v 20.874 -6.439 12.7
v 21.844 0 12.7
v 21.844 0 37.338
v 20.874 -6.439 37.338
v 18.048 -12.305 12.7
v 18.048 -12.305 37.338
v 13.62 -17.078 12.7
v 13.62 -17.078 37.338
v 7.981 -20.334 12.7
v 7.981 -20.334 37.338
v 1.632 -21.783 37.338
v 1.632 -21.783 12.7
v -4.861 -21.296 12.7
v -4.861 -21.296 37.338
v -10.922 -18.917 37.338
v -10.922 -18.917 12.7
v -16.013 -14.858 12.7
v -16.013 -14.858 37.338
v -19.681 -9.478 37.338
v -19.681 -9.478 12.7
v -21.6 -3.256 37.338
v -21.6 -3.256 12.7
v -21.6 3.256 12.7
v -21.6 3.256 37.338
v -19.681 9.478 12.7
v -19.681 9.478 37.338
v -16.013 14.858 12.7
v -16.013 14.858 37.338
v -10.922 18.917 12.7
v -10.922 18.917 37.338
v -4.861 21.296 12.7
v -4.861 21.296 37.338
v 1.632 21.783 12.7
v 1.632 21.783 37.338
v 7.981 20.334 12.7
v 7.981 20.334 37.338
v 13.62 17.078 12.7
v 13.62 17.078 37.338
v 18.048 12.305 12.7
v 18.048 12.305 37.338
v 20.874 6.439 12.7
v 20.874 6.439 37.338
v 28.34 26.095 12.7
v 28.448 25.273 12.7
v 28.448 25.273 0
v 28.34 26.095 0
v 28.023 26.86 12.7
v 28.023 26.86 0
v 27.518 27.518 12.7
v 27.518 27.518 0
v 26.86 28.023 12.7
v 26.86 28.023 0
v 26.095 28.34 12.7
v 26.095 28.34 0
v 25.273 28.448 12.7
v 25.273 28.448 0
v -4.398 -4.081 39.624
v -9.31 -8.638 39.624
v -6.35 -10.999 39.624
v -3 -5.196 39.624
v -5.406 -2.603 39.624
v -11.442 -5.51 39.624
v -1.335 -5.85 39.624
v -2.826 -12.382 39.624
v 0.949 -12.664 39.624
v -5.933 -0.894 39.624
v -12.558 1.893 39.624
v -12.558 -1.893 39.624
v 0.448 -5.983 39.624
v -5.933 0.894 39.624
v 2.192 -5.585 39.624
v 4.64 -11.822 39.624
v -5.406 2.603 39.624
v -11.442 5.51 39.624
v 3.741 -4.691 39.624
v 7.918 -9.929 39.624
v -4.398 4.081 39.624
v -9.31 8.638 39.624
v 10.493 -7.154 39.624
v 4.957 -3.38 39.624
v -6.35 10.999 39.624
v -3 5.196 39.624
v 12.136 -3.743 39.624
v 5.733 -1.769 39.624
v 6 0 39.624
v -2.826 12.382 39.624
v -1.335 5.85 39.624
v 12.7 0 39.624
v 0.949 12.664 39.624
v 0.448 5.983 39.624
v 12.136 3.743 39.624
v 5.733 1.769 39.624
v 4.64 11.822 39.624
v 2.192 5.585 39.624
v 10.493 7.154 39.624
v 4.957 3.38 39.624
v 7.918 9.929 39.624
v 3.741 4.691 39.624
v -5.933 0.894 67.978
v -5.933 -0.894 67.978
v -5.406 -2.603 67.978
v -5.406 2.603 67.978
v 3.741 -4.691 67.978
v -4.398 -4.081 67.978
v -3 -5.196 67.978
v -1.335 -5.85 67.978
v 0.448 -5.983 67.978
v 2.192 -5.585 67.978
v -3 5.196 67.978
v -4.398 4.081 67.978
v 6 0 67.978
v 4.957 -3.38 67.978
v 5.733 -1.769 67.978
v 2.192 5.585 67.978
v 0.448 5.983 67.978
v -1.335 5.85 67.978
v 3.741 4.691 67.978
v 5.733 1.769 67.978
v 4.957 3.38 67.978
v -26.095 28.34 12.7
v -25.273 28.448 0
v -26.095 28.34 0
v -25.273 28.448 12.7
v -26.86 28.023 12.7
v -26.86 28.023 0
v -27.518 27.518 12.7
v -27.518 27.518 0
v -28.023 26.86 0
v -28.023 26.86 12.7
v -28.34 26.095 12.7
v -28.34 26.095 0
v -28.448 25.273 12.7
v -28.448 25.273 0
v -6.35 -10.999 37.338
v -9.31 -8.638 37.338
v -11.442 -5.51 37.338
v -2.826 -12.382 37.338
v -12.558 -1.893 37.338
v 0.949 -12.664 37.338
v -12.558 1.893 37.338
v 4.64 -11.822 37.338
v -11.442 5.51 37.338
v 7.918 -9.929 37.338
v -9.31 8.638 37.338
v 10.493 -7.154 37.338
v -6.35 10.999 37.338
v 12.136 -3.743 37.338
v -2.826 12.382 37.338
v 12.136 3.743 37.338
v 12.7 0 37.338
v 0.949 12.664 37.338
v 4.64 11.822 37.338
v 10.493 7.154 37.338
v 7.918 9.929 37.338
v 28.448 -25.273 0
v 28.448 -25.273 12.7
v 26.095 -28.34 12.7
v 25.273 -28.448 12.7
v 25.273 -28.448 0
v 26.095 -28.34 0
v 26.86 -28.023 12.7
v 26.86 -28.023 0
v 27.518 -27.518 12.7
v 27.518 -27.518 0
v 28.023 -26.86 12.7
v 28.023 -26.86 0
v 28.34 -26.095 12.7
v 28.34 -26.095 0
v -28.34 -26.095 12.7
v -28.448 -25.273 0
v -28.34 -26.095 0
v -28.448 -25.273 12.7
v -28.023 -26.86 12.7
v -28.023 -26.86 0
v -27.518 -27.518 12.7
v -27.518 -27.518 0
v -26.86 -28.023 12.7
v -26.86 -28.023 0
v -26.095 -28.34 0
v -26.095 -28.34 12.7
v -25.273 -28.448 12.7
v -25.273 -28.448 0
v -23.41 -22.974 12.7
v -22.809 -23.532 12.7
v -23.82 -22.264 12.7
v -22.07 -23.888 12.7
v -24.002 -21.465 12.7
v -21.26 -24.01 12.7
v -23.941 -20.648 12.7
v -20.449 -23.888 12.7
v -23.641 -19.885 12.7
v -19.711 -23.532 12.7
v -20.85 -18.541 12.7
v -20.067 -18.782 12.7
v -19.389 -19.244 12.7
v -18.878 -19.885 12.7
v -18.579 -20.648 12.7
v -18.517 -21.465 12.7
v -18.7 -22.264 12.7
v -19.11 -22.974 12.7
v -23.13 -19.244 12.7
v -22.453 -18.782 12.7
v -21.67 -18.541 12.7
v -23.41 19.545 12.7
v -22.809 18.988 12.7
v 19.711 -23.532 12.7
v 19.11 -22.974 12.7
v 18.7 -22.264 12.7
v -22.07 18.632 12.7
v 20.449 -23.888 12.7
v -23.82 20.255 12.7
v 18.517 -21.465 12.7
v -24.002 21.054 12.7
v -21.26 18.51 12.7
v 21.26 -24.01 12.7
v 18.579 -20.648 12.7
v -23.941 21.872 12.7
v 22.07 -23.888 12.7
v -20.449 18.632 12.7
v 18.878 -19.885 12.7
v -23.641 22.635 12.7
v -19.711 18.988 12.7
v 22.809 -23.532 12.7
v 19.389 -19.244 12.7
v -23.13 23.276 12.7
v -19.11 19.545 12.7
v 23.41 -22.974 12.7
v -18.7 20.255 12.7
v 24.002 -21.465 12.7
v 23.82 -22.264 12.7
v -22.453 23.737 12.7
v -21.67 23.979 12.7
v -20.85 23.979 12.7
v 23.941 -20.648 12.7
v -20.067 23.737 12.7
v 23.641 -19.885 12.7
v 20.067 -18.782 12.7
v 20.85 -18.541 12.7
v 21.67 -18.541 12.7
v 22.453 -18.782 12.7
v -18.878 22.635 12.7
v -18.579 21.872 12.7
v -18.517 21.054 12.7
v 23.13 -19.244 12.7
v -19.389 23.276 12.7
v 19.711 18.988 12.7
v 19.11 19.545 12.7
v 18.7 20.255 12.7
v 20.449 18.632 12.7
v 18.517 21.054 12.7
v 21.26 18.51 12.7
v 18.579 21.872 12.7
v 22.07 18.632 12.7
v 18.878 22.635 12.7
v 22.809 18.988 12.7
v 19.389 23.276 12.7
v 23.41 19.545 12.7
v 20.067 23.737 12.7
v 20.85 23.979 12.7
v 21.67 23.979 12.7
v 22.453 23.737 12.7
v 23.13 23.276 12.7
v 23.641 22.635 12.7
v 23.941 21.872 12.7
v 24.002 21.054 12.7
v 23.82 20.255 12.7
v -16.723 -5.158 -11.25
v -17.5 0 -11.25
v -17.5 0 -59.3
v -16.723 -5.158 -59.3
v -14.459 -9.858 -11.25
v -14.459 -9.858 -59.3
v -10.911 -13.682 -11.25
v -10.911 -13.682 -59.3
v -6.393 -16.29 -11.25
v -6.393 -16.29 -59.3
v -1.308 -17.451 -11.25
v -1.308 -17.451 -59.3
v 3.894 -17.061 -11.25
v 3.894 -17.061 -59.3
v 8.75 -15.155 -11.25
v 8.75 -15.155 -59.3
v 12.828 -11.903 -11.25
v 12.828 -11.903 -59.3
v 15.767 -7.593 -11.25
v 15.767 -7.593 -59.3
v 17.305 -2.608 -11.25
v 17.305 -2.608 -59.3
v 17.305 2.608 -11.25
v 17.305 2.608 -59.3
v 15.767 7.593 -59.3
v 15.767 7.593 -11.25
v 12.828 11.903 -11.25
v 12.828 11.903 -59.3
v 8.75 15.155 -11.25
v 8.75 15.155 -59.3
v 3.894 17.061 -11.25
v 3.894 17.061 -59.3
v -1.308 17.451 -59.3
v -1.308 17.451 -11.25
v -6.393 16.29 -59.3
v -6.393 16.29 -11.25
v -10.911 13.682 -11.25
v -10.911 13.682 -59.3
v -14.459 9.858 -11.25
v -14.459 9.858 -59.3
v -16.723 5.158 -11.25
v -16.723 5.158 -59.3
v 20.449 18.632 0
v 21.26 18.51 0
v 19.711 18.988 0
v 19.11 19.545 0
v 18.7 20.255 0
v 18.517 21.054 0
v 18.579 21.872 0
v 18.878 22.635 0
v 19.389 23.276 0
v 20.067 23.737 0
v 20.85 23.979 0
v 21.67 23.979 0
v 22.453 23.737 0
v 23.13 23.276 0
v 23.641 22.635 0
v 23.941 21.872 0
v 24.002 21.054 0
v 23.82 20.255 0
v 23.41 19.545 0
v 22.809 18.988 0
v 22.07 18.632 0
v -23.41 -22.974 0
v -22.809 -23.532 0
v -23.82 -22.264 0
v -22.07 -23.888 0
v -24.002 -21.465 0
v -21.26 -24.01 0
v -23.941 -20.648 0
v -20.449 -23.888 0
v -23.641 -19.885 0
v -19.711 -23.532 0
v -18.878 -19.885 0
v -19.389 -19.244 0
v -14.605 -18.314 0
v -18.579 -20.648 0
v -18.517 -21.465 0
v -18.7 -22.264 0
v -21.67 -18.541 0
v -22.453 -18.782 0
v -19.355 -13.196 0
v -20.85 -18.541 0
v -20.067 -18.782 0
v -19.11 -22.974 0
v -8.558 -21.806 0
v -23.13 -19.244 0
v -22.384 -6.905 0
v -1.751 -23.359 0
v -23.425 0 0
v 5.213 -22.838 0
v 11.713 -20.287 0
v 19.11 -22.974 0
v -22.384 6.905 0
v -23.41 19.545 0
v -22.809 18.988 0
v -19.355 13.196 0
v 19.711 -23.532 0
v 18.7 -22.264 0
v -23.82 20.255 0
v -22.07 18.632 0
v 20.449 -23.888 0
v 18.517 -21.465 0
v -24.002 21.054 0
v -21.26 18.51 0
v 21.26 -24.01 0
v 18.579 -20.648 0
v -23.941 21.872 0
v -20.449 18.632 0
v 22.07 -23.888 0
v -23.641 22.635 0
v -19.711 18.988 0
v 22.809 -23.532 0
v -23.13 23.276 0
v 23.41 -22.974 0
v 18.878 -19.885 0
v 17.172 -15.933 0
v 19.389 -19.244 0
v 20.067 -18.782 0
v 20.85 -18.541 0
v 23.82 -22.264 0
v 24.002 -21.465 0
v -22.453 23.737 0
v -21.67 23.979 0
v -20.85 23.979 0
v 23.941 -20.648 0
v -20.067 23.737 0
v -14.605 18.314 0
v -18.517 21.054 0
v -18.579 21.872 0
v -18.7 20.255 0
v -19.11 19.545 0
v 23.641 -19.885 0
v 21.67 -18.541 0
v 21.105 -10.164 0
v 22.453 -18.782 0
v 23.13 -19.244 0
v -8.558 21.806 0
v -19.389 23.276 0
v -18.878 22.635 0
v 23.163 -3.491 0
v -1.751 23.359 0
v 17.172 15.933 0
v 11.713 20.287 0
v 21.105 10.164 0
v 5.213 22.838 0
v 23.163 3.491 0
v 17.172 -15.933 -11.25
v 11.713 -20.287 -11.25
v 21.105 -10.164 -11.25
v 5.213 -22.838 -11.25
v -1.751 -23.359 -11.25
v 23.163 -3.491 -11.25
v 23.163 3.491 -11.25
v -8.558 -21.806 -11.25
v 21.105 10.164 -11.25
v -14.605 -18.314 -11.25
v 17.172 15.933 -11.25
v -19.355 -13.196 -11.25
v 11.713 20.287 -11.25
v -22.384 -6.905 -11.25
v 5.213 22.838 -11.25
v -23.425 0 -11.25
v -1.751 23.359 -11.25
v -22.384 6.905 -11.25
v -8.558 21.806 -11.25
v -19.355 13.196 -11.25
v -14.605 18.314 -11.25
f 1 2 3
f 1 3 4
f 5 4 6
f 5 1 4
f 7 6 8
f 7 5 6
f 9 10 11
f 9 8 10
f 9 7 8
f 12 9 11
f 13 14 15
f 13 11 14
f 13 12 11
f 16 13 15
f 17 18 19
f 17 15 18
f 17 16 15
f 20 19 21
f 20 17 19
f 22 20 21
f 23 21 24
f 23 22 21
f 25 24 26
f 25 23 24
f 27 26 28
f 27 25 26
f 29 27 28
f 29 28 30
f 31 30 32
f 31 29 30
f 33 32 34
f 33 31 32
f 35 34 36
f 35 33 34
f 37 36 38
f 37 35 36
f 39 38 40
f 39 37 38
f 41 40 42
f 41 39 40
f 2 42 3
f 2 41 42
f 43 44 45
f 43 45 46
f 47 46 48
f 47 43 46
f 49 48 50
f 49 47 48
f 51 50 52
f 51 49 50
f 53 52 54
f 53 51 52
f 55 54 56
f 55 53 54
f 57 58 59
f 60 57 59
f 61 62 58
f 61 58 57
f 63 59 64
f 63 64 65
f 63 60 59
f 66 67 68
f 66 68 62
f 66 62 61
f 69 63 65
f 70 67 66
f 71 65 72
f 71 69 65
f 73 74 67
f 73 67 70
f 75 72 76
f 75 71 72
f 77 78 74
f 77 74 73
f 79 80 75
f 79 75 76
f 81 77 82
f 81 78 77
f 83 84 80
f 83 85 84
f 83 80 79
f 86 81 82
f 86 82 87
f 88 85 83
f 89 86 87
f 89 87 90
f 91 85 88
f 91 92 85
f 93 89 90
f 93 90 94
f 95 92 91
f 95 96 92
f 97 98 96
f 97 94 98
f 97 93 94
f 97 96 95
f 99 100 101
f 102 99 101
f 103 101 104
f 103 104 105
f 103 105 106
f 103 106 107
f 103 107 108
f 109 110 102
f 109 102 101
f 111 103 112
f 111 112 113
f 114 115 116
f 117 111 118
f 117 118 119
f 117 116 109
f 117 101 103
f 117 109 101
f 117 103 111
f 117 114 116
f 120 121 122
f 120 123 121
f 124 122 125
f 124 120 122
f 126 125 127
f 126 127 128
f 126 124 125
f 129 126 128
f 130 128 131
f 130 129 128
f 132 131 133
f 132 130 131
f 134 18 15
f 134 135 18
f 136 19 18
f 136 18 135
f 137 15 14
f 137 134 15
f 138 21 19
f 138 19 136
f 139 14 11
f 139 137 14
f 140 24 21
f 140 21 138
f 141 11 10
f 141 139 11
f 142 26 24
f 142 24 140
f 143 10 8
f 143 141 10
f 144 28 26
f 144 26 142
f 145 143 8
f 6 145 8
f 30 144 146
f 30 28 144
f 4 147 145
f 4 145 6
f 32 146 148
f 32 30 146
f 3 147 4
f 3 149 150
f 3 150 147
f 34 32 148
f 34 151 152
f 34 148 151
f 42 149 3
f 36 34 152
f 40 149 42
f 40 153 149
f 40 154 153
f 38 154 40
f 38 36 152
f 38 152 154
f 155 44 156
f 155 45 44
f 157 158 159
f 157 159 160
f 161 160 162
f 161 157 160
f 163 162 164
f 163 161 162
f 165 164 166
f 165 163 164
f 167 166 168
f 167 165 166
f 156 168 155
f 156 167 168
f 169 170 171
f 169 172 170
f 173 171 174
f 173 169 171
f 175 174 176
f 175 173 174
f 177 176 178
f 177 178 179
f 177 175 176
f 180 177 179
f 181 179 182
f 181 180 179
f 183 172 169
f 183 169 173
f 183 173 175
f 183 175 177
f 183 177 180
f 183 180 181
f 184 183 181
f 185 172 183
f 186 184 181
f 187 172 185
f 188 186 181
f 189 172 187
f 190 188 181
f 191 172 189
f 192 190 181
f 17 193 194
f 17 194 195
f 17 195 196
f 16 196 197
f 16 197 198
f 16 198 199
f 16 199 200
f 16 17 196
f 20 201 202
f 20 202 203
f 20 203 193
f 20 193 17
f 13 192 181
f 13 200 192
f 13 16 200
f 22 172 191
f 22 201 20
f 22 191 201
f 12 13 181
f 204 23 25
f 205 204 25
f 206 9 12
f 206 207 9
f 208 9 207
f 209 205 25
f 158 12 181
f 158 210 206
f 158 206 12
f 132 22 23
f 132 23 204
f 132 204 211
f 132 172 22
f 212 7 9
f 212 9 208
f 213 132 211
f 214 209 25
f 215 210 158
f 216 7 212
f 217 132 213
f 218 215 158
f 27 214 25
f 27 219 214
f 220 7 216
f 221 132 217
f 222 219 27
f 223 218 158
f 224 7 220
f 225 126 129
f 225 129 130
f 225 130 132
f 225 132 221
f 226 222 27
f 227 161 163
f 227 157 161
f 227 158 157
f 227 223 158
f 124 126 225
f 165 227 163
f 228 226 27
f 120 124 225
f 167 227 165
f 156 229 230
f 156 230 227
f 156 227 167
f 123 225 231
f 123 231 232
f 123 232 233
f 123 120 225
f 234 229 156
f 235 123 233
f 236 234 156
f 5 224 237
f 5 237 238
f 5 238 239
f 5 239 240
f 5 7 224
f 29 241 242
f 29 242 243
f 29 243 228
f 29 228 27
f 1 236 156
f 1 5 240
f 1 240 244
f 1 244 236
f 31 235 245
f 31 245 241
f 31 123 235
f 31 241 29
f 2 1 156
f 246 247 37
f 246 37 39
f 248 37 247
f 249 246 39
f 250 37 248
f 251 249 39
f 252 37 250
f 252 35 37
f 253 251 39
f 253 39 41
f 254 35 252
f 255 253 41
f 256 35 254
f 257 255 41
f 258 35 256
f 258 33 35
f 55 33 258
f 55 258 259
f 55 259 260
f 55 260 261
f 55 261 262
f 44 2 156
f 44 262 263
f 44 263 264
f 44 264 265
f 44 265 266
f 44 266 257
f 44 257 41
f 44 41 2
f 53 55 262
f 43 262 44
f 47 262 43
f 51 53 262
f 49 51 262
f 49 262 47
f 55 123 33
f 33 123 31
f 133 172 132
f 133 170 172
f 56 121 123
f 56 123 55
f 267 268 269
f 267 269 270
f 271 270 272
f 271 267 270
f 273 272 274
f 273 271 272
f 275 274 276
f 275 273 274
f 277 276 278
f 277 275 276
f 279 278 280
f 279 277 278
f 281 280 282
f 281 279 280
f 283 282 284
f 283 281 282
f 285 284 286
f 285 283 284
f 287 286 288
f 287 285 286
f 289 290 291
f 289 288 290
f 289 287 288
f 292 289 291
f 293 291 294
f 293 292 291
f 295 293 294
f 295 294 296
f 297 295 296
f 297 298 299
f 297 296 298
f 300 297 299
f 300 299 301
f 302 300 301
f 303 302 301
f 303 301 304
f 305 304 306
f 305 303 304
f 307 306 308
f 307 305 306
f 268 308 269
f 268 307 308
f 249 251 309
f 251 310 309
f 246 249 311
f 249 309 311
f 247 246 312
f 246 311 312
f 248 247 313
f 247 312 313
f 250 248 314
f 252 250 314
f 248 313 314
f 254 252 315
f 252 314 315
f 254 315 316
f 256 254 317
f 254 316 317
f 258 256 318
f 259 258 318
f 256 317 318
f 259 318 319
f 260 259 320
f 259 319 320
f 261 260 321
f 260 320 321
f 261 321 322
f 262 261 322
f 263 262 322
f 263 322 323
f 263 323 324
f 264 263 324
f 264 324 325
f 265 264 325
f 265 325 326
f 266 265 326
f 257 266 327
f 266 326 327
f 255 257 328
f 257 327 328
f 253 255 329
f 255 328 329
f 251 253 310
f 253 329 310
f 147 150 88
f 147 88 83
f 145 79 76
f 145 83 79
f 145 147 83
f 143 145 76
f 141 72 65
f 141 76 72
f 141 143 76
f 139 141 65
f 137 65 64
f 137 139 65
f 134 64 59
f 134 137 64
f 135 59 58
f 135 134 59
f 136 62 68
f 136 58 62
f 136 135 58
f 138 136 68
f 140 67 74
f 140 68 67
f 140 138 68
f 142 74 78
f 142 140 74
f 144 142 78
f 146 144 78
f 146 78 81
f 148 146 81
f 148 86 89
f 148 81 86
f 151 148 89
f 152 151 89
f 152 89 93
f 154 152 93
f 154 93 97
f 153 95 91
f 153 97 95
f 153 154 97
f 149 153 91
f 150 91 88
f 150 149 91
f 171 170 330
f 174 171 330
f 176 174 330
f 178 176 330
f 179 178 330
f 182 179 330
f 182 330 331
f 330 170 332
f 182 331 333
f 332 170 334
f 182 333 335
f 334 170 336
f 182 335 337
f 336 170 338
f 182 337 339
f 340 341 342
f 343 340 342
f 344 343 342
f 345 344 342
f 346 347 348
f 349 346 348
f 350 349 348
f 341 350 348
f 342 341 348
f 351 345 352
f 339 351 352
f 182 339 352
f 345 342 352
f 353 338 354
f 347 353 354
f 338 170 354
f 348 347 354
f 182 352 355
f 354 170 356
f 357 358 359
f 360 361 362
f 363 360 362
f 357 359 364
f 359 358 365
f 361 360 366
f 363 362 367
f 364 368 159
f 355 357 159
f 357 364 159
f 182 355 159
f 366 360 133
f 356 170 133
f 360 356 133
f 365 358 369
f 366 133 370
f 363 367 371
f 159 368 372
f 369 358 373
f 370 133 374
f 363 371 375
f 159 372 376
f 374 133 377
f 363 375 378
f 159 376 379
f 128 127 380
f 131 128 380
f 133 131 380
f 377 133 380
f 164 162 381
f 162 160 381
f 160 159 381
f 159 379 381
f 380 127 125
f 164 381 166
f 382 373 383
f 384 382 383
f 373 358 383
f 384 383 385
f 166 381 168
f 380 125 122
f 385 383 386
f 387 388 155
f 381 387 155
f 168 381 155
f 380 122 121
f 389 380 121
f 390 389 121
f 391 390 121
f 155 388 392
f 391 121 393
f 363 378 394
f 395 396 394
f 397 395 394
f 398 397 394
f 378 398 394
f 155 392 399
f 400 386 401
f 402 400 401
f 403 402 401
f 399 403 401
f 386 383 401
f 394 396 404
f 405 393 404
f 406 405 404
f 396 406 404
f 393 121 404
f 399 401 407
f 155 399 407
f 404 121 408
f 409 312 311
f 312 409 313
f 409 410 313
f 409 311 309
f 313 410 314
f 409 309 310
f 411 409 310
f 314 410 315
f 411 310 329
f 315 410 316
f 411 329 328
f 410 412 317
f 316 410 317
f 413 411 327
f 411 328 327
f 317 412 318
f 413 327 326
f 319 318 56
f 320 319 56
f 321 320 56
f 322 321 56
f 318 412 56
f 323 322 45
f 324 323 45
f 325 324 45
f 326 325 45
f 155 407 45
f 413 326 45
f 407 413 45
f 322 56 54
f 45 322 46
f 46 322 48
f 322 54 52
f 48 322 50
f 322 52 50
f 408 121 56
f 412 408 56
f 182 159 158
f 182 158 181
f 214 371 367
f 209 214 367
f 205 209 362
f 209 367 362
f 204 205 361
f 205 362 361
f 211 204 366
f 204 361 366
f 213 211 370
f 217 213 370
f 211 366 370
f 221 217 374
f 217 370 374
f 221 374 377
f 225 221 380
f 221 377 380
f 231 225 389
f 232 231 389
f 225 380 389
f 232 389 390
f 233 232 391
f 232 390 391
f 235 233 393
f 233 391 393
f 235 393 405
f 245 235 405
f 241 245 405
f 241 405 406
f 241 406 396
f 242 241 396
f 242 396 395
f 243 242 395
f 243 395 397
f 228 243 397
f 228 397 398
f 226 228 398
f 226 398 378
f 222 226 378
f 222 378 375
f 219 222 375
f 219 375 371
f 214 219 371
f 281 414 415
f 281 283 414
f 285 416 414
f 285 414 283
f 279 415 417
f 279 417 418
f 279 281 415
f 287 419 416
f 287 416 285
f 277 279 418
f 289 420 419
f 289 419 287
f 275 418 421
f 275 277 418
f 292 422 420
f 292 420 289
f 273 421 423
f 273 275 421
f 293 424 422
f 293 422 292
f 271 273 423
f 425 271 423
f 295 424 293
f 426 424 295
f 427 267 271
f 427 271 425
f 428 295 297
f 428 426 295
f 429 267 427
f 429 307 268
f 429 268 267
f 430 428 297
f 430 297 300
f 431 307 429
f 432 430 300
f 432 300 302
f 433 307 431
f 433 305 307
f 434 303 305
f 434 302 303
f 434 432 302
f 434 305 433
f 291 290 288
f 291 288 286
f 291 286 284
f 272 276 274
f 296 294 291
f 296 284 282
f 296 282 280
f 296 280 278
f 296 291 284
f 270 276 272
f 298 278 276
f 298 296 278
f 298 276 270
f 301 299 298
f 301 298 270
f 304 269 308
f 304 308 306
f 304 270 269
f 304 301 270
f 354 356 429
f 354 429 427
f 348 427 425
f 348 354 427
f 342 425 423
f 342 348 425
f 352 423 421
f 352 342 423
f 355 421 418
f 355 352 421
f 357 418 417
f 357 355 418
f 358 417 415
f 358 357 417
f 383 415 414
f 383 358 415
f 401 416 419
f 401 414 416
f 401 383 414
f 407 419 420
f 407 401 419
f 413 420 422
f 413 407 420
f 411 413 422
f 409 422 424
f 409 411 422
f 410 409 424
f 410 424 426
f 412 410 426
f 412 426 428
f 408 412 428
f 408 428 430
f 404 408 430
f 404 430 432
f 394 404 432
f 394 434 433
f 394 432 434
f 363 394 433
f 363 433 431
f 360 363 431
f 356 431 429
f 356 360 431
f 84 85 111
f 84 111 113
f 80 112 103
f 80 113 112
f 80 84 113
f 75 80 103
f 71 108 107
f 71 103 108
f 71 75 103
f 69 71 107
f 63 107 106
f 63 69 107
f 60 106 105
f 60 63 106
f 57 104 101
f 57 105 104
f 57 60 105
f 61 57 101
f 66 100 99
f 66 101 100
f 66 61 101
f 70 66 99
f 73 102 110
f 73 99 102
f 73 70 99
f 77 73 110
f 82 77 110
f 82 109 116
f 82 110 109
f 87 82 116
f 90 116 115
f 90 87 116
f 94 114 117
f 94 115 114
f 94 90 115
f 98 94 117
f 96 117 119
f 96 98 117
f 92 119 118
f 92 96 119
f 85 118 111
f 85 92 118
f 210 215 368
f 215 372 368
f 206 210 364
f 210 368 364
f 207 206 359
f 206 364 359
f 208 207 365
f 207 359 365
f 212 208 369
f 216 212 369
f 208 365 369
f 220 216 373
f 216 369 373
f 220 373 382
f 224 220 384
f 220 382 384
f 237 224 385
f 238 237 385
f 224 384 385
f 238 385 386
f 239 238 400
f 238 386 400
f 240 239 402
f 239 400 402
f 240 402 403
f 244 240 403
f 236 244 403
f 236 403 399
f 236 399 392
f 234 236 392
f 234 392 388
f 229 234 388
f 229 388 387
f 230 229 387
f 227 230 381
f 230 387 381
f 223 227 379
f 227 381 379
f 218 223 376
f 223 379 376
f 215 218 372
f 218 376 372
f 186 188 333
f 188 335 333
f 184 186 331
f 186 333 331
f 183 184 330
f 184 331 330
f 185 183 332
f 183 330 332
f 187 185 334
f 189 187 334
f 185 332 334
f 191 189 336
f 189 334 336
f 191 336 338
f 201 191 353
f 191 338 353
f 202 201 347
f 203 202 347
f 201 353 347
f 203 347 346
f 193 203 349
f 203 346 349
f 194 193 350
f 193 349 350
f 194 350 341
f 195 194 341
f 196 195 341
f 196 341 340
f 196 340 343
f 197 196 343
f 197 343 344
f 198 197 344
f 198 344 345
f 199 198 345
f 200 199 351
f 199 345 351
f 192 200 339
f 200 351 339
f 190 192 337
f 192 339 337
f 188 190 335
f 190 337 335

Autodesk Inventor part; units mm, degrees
ref_plane "YZ Plane" through (0, 0, 0) normal (1, 0, 0) x (0, 1, 0)
ref_plane "XZ Plane" through (0, 0, 0) normal (0, 1, 0) x (-1, 0, 0)
ref_plane "XY Plane" through (0, 0, 0) normal (0, 0, 1) x (1, 0, 0)
sketch "Sketch1" plane through (0, 0, 0) normal (0, 0, 1) x (1, 0, 0)
  line L0 (-28.448, 28.448) -> (28.448, 28.448)
  line L1 (28.448, 28.448) -> (28.448, -28.448)
  line L2 (28.448, -28.448) -> (-28.448, -28.448)
  line L3 (-28.448, -28.448) -> (-28.448, 28.448)
  point P0 (0, 0)
  point P1 (-28.448, 0)
  point P2 (0, 28.448)
  dimension "d0" = 56.896
extrude "Extrusion1" add sketch "Sketch1" along normal blind 12.7
sketch "Sketch2" plane through (0, 0, 12.7) normal (0, 0, 1) x (1, 0, 0)
  circle A0 centre (0, 0) radius 21.844
  dimension "d4" = 43.688
extrude "Extrusion2" add sketch "Sketch2" along normal blind 24.638
sketch "Sketch3" plane through (0, 0, 37.338) normal (0, 0, 1) x (1, 0, 0)
  circle A0 centre (0, 0) radius 21.844 projected
  circle A1 centre (0, 0) radius 6
  dimension "d8" = 12
extrude "Extrusion3" add sketch "Sketch3" along normal blind 30.64 contours A1
thread "Thread1" size "1/2-13 UNC" class "2A" standard "ANSI Unified Screw Threads" full length
sketch "Sketch4" plane through (0, 0, 0) normal (0, 0, -1) x (-1, 0, 0)
  circle A0 centre (0, 0) radius 23.425
  dimension "d14" = 46.85
extrude "Extrusion4" add sketch "Sketch4" along normal blind 11.25
fillet "Fillet1" radius 3.175 4 edges at (28.448, 28.448, 6.35) (-28.448, 28.448, 6.35) (28.448, -28.448, 6.35) (-28.448, -28.448, 6.35)
sketch "Sketch5" plane through (0, 0, -11.25) normal (0, 0, -1) x (-1, 0, 0)
  circle A0 centre (0, 0) radius 23.425 projected
  circle A1 centre (0, 0) radius 17.5
  dimension "d21" = 35
extrude "Extrusion5" add sketch "Sketch5" along normal blind 48.05 contours A1
sketch "Sketch6" plane through (0, 0, 12.7) normal (0, 0, 1) x (1, 0, 0)
  line L0 (28.448, -25.273) -> (28.448, 25.273) projected
  line L1 (25.273, 28.448) -> (-25.273, 28.448) projected
  line L2 (-28.448, 25.273) -> (-28.448, -25.273) projected
  line L3 (21.2598, 21.2598) -> (21.2598, -21.2598)
  line L4 (-21.2598, 21.2598) -> (21.2598, 21.2598)
  point P0 (-21.2598, -21.2598)
  point P1 (0, 21.2598)
  point P2 (0, 28.448)
  point P3 (21.2598, 0)
  point P4 (28.448, 0)
  dimension "d25" = 42.5196
  dimension "d27" = 42.5196
hole "Hole1" at (-21.2598, 21.2598, 12.7) at (21.2598, 21.2598, 12.7) at (21.2598, -21.2598, 12.7) at (-21.2598, -21.2598, 12.7) direction (0, 0, -1) diameter 5.5 end through all
sketch "Sketch7" plane through (0, 0, 37.338) normal (0, 0, 1) x (1, 0, 0)
  circle A0 centre (0, 0) radius 6 projected
  circle A1 centre (0, 0) radius 21.844 projected
  circle A2 centre (0, 0) radius 12.7
  dimension "d35" = 25.4
extrude "Extrusion6" add sketch "Sketch7" along normal blind 2.286 contours A2
properties part number "Pg_15"
